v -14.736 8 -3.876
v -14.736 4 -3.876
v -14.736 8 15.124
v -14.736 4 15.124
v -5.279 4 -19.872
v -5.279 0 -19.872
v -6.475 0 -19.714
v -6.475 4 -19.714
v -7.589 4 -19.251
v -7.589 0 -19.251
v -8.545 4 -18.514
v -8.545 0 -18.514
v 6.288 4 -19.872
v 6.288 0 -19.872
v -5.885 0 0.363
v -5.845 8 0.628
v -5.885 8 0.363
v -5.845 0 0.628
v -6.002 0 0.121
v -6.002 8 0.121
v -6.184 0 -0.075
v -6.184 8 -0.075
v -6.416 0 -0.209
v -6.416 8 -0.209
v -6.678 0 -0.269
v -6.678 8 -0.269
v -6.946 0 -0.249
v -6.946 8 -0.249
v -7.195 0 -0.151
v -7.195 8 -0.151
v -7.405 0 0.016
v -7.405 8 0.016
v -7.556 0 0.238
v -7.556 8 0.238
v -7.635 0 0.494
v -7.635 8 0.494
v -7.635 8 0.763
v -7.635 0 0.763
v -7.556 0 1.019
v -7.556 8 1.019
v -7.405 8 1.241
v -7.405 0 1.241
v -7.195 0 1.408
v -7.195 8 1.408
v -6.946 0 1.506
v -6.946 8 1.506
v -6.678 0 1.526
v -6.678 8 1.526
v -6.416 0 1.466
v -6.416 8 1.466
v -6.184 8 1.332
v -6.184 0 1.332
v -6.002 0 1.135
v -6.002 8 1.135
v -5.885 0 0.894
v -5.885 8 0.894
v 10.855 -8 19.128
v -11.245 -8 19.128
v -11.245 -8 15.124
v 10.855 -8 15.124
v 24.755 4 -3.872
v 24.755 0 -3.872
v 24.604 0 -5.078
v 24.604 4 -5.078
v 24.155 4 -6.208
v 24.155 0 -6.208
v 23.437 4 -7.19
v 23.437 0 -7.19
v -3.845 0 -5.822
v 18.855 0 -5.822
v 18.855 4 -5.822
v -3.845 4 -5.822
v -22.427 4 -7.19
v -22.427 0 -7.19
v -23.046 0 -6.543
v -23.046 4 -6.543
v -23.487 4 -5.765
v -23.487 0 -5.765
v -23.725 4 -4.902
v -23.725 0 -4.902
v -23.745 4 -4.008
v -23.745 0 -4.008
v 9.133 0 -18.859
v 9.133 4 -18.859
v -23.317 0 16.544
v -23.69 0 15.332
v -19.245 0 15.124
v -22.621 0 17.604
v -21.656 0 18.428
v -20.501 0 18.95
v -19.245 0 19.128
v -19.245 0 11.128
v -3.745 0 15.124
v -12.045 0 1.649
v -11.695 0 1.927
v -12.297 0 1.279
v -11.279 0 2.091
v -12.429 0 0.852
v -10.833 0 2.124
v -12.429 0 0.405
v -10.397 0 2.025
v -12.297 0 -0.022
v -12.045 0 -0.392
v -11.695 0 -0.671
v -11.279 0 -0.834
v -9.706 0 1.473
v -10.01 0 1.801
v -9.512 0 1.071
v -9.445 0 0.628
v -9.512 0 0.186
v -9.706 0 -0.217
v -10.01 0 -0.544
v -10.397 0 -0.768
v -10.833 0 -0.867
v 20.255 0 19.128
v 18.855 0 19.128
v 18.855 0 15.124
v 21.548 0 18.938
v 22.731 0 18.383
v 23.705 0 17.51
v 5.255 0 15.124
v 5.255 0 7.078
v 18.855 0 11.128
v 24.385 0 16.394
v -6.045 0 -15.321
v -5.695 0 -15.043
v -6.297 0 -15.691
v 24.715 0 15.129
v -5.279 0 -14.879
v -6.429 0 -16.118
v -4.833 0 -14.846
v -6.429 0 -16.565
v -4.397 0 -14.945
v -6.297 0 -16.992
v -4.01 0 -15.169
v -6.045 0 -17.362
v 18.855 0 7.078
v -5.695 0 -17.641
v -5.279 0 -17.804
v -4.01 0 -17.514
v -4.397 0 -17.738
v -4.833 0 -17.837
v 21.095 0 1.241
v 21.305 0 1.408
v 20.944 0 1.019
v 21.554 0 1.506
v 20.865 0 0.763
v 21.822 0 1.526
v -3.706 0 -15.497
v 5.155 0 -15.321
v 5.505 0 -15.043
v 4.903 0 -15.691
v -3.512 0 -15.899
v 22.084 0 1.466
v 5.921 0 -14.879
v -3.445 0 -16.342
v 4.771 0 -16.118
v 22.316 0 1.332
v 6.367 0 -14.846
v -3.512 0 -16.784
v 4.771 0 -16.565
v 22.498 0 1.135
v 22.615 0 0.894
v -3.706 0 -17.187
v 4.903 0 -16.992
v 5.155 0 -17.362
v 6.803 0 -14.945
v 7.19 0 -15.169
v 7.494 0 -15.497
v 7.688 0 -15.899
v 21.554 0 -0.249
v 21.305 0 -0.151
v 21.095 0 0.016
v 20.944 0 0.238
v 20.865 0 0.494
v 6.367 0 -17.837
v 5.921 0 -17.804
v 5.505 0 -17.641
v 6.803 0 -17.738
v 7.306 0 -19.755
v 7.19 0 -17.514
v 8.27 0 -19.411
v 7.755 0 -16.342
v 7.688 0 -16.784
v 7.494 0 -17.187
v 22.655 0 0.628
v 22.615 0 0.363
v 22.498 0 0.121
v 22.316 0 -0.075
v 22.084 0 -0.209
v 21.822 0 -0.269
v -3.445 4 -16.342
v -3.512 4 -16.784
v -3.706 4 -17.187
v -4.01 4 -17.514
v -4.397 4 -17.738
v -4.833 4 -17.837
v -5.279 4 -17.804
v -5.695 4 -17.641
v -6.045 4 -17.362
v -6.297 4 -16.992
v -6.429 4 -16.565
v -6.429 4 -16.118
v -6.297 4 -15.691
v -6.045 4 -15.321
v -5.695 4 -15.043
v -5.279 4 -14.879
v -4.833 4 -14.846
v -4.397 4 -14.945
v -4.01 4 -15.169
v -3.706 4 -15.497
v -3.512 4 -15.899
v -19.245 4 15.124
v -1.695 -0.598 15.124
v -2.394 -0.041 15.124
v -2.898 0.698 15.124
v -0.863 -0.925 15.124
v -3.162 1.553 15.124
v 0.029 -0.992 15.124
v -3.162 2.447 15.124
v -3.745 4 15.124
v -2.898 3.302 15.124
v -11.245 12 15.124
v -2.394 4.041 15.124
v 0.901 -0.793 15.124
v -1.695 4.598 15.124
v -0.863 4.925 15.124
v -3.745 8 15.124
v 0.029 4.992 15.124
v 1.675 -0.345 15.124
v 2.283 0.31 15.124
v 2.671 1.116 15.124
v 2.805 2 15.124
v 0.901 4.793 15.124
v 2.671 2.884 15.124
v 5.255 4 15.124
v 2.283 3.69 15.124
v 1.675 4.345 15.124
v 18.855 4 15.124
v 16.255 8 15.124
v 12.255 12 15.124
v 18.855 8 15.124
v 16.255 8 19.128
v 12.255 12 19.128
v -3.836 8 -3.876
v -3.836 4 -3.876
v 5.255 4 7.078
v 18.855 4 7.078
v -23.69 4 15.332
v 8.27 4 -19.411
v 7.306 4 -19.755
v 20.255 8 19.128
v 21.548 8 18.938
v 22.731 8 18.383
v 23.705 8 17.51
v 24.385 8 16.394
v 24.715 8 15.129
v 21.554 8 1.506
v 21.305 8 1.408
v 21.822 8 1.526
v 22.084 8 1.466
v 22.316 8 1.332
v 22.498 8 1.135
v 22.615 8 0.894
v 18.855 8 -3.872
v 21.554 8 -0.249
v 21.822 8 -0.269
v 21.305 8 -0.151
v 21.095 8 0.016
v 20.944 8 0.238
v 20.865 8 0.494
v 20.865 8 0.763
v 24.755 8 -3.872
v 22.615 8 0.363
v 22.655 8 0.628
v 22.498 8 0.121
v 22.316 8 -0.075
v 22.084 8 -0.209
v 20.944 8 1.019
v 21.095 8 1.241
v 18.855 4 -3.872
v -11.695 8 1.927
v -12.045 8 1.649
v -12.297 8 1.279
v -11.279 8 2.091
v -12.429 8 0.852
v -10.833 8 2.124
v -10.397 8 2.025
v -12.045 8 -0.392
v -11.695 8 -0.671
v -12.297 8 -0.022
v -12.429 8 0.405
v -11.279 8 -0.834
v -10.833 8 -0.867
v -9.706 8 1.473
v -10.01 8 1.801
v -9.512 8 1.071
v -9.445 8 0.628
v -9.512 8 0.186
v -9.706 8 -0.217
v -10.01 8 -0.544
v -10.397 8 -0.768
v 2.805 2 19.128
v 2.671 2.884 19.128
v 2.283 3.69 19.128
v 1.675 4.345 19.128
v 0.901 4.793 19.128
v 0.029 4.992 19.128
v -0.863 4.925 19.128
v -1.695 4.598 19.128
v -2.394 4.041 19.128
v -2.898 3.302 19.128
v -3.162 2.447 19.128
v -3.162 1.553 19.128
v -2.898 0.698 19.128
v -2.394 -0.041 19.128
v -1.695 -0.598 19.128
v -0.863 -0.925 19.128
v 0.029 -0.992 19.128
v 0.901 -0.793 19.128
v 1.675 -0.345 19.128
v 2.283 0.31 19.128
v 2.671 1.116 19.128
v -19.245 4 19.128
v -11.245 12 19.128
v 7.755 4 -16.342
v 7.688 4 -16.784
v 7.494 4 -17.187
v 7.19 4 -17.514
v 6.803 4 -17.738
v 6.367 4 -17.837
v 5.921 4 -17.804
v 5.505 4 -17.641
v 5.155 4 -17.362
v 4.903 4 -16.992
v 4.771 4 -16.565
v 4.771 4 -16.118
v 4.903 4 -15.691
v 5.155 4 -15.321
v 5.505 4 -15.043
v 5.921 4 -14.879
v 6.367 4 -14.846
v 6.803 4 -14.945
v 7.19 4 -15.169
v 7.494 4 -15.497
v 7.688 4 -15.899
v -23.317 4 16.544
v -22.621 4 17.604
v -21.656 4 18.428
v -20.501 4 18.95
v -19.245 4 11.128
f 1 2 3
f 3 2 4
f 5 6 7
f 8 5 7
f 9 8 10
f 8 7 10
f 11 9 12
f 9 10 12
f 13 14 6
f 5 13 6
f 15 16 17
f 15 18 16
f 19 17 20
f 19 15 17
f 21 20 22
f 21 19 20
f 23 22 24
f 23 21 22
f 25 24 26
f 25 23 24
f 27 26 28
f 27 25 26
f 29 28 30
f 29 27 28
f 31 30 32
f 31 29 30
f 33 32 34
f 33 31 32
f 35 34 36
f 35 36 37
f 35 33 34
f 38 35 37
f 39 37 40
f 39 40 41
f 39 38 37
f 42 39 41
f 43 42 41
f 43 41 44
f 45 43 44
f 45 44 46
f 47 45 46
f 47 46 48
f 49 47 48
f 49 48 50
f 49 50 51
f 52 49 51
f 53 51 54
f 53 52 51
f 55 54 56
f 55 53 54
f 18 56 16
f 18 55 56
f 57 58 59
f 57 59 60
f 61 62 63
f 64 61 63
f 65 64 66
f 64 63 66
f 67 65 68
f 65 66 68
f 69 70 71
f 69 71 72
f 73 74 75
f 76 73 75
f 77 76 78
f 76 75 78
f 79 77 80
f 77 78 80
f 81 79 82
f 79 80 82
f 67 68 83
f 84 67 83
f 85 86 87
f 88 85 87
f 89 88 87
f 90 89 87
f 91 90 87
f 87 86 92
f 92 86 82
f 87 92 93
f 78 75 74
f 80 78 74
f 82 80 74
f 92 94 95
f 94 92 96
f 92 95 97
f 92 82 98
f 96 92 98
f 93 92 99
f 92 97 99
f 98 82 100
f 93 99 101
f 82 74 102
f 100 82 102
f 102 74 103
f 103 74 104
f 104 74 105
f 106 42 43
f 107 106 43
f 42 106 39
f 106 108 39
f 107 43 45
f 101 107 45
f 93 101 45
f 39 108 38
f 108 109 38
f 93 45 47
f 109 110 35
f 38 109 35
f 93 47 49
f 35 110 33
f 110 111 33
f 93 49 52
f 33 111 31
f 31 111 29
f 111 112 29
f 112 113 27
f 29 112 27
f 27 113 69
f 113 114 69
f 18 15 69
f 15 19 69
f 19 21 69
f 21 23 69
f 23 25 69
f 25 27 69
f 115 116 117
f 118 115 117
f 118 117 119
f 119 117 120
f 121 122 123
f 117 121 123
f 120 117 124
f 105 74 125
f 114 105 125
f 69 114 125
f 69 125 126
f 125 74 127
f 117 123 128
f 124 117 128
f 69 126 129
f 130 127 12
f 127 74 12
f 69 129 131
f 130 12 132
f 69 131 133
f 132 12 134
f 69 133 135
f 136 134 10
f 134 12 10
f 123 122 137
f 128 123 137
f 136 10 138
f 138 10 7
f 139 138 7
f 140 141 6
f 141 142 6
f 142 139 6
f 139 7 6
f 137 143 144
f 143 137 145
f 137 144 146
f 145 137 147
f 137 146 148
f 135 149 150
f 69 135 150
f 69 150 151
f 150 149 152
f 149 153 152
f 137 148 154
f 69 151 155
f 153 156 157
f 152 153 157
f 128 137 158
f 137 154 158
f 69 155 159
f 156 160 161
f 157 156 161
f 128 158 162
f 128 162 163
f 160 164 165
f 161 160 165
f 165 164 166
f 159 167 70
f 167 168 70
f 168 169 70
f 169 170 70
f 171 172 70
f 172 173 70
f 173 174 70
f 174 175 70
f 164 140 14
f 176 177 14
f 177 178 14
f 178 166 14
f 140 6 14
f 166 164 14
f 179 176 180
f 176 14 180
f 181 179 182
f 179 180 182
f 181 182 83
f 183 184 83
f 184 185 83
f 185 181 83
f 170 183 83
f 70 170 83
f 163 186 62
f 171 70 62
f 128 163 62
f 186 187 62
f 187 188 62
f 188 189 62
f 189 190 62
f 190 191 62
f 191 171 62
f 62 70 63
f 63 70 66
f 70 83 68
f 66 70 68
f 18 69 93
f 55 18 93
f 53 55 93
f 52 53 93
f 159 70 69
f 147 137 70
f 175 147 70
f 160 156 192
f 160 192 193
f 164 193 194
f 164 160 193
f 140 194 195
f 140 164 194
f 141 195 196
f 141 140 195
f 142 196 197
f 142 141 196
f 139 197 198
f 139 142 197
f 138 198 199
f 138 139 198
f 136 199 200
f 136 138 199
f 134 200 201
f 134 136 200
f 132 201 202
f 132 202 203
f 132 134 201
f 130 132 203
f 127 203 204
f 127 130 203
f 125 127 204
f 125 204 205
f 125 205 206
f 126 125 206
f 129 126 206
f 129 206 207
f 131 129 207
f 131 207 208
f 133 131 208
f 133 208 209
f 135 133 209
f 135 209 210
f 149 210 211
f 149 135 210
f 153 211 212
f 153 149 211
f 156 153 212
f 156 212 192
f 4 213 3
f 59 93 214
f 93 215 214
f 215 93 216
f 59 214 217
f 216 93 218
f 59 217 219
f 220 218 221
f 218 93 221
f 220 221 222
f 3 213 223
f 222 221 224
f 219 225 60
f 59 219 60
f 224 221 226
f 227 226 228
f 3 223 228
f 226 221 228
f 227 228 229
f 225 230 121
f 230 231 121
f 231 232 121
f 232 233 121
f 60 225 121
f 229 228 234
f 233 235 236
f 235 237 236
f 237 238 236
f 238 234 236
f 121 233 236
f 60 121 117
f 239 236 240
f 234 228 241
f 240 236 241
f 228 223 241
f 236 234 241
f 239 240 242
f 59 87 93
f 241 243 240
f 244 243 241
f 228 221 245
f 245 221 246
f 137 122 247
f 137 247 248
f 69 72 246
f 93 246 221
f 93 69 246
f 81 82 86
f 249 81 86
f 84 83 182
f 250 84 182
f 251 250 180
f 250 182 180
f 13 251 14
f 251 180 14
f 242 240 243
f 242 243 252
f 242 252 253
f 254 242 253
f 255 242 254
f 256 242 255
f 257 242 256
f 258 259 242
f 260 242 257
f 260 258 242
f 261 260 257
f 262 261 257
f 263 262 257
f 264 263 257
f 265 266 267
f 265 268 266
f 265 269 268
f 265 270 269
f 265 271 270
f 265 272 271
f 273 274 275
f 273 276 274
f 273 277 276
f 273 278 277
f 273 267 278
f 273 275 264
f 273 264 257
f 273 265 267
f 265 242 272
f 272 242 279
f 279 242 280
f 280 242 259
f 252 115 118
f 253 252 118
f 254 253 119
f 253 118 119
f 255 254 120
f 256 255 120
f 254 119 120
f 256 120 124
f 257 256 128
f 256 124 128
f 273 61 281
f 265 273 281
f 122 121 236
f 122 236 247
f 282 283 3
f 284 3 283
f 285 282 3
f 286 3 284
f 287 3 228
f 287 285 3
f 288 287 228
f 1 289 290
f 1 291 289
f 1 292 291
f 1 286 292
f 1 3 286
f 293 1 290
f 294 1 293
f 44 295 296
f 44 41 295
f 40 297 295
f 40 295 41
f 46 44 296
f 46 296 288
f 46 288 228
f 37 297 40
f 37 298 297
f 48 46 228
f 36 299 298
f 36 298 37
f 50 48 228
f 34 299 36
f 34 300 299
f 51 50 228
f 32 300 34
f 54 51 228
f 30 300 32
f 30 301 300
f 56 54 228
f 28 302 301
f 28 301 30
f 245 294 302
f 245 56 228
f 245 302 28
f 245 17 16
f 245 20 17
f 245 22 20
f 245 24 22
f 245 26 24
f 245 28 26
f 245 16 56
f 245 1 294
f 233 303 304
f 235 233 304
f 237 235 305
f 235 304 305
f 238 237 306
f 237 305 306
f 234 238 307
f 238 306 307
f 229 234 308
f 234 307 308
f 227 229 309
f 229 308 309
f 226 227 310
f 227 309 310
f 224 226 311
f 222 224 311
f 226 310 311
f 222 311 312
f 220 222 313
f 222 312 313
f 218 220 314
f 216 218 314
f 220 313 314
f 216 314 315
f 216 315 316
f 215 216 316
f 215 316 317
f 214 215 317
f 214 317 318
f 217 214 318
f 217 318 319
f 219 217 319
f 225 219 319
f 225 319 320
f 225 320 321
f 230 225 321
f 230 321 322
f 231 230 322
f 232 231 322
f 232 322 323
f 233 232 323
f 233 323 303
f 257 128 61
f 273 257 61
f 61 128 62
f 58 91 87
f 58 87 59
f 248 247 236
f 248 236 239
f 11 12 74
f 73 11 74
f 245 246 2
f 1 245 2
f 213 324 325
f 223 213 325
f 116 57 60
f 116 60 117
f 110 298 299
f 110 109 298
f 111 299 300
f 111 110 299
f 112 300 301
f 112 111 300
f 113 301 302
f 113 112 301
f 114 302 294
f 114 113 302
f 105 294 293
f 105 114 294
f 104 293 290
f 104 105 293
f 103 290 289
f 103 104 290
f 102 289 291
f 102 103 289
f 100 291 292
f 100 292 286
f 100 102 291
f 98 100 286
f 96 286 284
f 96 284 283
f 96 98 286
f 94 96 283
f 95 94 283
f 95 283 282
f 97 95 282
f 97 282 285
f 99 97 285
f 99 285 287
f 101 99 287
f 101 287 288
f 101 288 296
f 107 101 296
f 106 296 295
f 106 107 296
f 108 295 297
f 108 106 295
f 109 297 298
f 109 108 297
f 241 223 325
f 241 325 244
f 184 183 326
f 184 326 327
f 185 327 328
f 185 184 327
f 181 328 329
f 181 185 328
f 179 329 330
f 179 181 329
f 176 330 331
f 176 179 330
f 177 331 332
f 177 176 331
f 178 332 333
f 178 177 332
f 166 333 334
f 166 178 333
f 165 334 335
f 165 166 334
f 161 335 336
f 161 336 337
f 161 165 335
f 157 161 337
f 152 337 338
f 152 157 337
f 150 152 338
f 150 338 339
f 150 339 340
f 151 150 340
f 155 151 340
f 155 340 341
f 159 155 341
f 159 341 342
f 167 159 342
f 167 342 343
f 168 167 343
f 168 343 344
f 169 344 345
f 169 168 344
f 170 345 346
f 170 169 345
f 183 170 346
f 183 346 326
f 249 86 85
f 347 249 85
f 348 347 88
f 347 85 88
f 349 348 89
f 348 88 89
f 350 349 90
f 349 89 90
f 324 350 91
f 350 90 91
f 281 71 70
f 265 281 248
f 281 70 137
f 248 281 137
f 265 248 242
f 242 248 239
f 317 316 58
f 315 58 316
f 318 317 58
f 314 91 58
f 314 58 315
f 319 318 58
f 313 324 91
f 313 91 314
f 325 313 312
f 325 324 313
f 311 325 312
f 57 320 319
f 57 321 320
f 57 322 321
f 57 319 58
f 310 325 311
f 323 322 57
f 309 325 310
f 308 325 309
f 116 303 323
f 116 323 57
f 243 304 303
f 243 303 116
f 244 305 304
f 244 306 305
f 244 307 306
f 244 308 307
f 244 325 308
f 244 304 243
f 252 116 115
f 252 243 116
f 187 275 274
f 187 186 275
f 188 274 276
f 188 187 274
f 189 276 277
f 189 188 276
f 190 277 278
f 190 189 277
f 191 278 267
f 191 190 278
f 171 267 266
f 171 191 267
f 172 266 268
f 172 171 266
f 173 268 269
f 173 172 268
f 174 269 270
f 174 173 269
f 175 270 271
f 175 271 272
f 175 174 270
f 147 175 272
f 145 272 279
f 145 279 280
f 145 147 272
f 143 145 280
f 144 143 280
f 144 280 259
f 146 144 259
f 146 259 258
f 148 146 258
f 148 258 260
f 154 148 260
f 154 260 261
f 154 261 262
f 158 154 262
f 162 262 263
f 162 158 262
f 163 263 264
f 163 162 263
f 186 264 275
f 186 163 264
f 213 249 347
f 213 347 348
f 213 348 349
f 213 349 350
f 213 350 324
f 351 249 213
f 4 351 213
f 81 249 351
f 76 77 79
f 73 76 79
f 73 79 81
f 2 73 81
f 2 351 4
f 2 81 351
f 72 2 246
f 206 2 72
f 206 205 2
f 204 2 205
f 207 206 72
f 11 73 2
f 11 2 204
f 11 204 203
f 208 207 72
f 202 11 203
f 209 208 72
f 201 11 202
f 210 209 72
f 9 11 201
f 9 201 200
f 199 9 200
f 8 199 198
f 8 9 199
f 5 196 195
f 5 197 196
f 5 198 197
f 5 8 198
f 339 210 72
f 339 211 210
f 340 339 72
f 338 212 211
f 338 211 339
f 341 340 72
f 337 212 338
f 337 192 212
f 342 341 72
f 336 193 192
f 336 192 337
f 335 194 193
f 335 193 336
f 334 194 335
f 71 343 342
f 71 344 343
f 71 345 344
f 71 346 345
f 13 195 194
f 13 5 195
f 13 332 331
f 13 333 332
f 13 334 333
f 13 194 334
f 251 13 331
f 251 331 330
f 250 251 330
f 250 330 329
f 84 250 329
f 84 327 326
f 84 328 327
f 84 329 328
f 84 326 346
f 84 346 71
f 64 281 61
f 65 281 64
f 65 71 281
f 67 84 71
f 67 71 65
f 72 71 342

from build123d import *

# Parameters (mm, degrees)
CROQUIS1_R              = 1.500000078
CROQUIS1_R_2            = 0.899999978
CROQUIS1_R_3            = 0.899999104
CROQUIS1_R_4            = 1.499997939
CROQUIS1_R_5            = 1.500000378
SALIENTE_EXTRUIR1_DEPTH = 4
CROQUIS2_R              = 1.500000078
CROQUIS2_R_2            = 0.899999978
CROQUIS2_R_3            = 0.899999104
SALIENTE_EXTRUIR2_DEPTH = 4
CROQUIS3_W              = 35.500002289
CROQUIS3_H              = 4.004000187
SALIENTE_EXTRUIR3_DEPTH = 4
CROQUIS4_W              = 38.100002289
CROQUIS4_H              = 4.004000187
SALIENTE_EXTRUIR4_DEPTH = 8
CROQUIS5_R              = 3
CORTAR_EXTRUIR1_DEPTH   = 8


with BuildPart() as part:
    # Croquis1 → Saliente-Extruir1 (new body)
    with BuildSketch(Plane(origin=(0, 0, 0), x_dir=(1, 0, 0), z_dir=(0, 1, 0))):
        with BuildLine():
            Line((-19.24526482, -19.128405422), (20.25473518, -19.128405422))
            ThreePointArc((20.25473518, -19.128405422), (23.250093999, -17.982284574), (24.715306469, -15.12940535))
            Line((24.715306469, -15.12940535), (24.75473518, 3.871594578))
            ThreePointArc((24.75473518, 3.871594578), (24.41495197, 5.657410091), (23.436719128, 7.189614445))
            Line((23.436719128, 7.189614445), (9.132638286, 18.858517697))
            ThreePointArc((9.132638286, 18.858517697), (7.79788024, 19.61076911), (6.288102337, 19.871598393))
            Line((6.288102337, 19.871598393), (-5.278630069, 19.871598393))
            ThreePointArc((-5.278630069, 19.871598393), (-7.047350485, 19.518737385), (-8.545265011, 18.514180332))
            Line((-8.545265011, 18.514180332), (-22.427247654, 7.189612922))
            ThreePointArc((-22.427247654, 7.189612922), (-23.487263037, 5.764725879), (-23.74526482, 4.007634312))
            Line((-23.74526482, 4.007634312), (-23.68986282, -15.332360357))
            ThreePointArc((-23.68986282, -15.332360357), (-22.167781266, -18.050232235), (-19.24526482, -19.128405422))
        make_face()
        with Locations((-10.945264306, -0.628405976)):
            Circle(CROQUIS1_R, mode=Mode.SUBTRACT)
        with Locations((-6.745264379, -0.628405738)):
            Circle(CROQUIS1_R_2, mode=Mode.SUBTRACT)
        with Locations((21.754736572, -0.628405422)):
            Circle(CROQUIS1_R_3, mode=Mode.SUBTRACT)
        with Locations((6.25473312, 16.341597706)):
            Circle(CROQUIS1_R_4, mode=Mode.SUBTRACT)
        with Locations((-4.945262866, 16.341595261)):
            Circle(CROQUIS1_R_5, mode=Mode.SUBTRACT)
        Polygon((-3.845263294, 5.821595341), (-3.74526482, -15.124405235), (5.25473518, -15.124405235), (5.25473518, -7.078405231), (18.854737469, -7.078405231), (18.854737469, 5.821595341), align=None, mode=Mode.SUBTRACT)
    extrude(amount=SALIENTE_EXTRUIR1_DEPTH)

    # Croquis2 → Saliente-Extruir2 (add)
    with BuildSketch(Plane(origin=(0, 4, 0), x_dir=(1, 0, 0), z_dir=(0, 1, 0))):
        with BuildLine():
            Line((-3.74526482, -15.124405235), (-3.835972877, 3.875594765))
            Line((-3.835972877, 3.875594765), (-14.735972877, 3.875594765))
            Line((-14.735972877, 3.875594765), (-14.735972877, -15.124405235))
            Line((-14.735972877, -15.124405235), (-19.24526482, -15.124405235))
            Line((-19.24526482, -15.124405235), (-19.24526482, -19.128405422))
            Line((-19.24526482, -19.128405422), (20.25473518, -19.128405422))
            ThreePointArc((20.25473518, -19.128405422), (23.250093999, -17.982284574), (24.715306469, -15.12940535))
            Line((24.715306469, -15.12940535), (24.75473518, 3.871594578))
            Line((24.75473518, 3.871594578), (18.854737469, 3.871594578))
            Line((18.854737469, 3.871594578), (18.854737469, -7.078405231))
            Line((18.854737469, -7.078405231), (18.854737469, -15.124405235))
            Line((18.854737469, -15.124405235), (5.25473518, -15.124405235))
            Line((5.25473518, -15.124405235), (-3.74526482, -15.124405235))
        make_face()
        with Locations((-10.945264306, -0.628405976)):
            Circle(CROQUIS2_R, mode=Mode.SUBTRACT)
        with Locations((-6.745264379, -0.628405738)):
            Circle(CROQUIS2_R_2, mode=Mode.SUBTRACT)
        with Locations((21.754736572, -0.628405422)):
            Circle(CROQUIS2_R_3, mode=Mode.SUBTRACT)
    extrude(amount=SALIENTE_EXTRUIR2_DEPTH)

    # Croquis3 → Saliente-Extruir3 (add)
    with BuildSketch(Plane(origin=(0, 8, 0), x_dir=(1, 0, 0), z_dir=(0, 1, 0))):
        with Locations((-1.495263676, -17.126405328)):
            Rectangle(CROQUIS3_W, CROQUIS3_H)
    extrude(amount=SALIENTE_EXTRUIR3_DEPTH)

    # Croquis4 → Saliente-Extruir4 (add)
    with BuildSketch(Plane.XZ):
        with Locations((-0.195263676, 17.126405328)):
            Rectangle(CROQUIS4_W, CROQUIS4_H)
    extrude(amount=SALIENTE_EXTRUIR4_DEPTH)

    # Croquis5 → Cortar-Extruir1 (cut)
    with BuildSketch(Plane.XY.offset(19.128405422)):
        with Locations((-0.195262531, 2)):
            Circle(CROQUIS5_R)
        Polygon((16.254737469, 8), (12.254737469, 12), (16.254737469, 12), align=None)
        Polygon((-19.24526482, 4), (-11.24526482, 12), (-19.24526482, 12), align=None)
        Polygon((-19.24526482, 0), (-11.24526482, -8), (-19.24526482, -8), align=None)
        Polygon((18.854737469, -8), (10.854737469, -8), (18.854737469, 0), align=None)
    extrude(amount=-CORTAR_EXTRUIR1_DEPTH, mode=Mode.SUBTRACT)


solid = part.part
